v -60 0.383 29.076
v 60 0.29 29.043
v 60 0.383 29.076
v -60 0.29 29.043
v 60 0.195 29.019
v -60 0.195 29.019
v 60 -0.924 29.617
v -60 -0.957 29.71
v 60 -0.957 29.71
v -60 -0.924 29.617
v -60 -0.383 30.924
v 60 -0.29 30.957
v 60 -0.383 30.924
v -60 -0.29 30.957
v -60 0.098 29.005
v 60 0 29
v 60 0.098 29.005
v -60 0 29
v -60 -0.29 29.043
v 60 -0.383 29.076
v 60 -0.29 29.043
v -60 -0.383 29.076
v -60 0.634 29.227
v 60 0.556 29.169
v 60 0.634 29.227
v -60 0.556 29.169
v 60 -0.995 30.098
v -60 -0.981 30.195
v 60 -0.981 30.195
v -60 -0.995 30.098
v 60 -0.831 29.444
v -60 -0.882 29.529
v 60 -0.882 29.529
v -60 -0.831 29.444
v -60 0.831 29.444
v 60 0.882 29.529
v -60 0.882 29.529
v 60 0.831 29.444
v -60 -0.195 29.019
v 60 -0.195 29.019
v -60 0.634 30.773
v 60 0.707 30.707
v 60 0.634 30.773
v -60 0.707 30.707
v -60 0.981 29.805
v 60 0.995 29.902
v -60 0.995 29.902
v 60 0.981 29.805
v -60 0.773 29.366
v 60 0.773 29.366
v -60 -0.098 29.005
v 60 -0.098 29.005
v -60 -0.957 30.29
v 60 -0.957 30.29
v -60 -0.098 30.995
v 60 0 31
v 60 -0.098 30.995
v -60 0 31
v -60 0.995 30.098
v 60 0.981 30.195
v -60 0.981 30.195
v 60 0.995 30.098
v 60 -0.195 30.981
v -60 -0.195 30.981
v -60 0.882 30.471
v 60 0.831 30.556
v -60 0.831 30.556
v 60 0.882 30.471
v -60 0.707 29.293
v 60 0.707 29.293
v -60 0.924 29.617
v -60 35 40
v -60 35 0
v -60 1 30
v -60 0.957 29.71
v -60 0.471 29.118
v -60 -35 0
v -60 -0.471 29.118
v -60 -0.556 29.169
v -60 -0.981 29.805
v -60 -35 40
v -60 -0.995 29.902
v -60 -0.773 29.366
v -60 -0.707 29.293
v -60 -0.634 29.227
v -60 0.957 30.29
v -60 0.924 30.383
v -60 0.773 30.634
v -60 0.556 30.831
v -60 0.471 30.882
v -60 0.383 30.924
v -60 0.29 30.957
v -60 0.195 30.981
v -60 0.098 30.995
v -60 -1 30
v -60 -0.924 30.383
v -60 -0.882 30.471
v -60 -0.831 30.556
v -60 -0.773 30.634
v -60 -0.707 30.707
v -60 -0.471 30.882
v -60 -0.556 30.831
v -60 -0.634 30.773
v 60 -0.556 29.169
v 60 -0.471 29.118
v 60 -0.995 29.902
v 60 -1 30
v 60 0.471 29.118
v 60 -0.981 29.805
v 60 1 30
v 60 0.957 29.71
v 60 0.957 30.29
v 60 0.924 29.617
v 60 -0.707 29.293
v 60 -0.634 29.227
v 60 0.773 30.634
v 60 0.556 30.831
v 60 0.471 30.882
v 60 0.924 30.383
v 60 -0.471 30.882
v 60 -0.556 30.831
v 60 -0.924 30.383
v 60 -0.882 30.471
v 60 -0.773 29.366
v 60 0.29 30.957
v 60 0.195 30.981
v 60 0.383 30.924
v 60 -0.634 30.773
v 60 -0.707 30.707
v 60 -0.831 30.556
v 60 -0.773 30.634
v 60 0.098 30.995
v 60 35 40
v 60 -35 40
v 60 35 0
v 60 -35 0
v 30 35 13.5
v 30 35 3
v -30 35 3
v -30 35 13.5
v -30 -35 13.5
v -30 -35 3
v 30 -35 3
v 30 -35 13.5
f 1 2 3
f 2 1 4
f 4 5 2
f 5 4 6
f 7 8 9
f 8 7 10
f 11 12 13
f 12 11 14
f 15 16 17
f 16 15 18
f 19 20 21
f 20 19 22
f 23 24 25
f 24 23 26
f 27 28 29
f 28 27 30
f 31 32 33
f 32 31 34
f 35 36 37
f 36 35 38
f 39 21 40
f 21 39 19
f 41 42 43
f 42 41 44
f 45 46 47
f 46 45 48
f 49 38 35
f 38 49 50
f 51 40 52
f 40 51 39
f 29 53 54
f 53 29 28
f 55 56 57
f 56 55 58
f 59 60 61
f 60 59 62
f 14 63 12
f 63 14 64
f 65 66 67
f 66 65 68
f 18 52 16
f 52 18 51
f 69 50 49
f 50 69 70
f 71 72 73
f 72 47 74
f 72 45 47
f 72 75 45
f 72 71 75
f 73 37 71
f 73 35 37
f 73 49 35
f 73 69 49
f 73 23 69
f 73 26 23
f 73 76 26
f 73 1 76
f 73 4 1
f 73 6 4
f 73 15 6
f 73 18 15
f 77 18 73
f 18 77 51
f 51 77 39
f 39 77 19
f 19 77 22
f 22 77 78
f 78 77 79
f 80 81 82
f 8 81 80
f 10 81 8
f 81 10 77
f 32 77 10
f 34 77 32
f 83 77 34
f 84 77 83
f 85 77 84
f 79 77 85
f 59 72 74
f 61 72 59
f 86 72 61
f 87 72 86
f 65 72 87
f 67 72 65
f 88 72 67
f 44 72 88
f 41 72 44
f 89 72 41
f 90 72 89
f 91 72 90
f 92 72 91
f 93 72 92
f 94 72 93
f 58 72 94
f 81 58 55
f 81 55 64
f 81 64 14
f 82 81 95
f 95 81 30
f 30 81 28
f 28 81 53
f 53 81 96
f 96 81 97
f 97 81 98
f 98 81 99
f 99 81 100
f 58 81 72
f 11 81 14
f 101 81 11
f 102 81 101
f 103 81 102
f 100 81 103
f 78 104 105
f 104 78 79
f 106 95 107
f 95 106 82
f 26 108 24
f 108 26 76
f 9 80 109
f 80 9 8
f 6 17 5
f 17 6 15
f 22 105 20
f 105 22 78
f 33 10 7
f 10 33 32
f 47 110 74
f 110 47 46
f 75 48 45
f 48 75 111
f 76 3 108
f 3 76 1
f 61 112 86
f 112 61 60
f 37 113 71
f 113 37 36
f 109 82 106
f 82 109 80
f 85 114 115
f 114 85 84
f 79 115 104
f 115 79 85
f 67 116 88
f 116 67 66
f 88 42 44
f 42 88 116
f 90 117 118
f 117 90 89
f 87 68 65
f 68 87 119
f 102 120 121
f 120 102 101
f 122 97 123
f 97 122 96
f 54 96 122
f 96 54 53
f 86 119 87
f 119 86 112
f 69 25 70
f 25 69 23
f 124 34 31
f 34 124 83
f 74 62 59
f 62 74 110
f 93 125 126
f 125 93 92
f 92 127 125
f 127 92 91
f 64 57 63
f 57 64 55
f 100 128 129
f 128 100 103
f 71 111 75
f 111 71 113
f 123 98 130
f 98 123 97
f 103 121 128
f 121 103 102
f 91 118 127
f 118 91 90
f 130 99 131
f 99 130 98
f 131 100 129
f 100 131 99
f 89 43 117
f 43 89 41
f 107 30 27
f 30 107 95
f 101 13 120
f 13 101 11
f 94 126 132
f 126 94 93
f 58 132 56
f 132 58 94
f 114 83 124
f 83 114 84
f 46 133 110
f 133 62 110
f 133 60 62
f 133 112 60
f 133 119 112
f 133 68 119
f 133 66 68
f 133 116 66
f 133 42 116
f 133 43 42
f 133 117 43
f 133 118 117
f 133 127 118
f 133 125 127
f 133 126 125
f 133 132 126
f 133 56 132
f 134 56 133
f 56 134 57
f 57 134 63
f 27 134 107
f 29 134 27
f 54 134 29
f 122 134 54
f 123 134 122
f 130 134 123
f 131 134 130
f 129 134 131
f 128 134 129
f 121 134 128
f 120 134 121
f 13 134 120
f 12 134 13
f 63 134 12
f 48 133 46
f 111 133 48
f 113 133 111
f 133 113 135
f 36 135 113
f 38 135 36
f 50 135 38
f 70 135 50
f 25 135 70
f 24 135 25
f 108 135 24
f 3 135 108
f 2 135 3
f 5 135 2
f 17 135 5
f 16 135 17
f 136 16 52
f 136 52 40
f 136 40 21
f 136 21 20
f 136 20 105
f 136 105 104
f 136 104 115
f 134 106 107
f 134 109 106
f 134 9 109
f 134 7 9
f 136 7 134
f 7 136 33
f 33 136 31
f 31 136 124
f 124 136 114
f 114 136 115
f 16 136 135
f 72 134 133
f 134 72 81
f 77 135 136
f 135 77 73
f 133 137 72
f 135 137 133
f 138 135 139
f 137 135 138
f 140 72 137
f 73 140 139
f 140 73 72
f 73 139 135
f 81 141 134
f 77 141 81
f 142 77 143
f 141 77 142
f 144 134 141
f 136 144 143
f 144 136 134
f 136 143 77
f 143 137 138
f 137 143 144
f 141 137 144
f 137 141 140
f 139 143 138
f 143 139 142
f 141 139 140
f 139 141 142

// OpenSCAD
// Mini horizontal gel-electrophoresis buffer tank
// Print orientation: base on XY plane, builds up +Z

$fn = 64;

// --- Tank dimensions ---
outer_x = 120;   // outer length in X
outer_y = 70;    // outer width in Y
height  = 40;    // overall height in Z
wall    = 3;     // wall thickness
floor   = 3;     // floor thickness

// --- Platform ---
plat_len   = 60;   // platform length in X
plat_top_z = 13;   // platform top height (10 mm above inner floor)

// --- Holes ---
hole_d = 2;     // electrode hole diameter
hole_y = 0;     // hole Y position
hole_z = 30;    // hole Z position

// --- Derived ---
inner_h = height - floor;              // inner floor to top opening
over    = 0.5;                         // cutter overshoot

difference() {
    // Tank body
    translate([-outer_x/2, -outer_y/2, 0])
        cube([outer_x, outer_y, height]);

    // Raised platform (full inner width, centred in X)
    translate([-plat_len/2, -outer_y/2, floor])
        cube([plat_len, outer_y, plat_top_z - floor + over]);

    // Electrode holes through end walls along X
    for (sx = [-1, 1])
        translate([sx > 0 ? outer_x/2 - over : -outer_x/2, hole_y, hole_z])
            rotate([0, 90, 0])
                cylinder(d = hole_d, h = outer_x + 2*over);
}
